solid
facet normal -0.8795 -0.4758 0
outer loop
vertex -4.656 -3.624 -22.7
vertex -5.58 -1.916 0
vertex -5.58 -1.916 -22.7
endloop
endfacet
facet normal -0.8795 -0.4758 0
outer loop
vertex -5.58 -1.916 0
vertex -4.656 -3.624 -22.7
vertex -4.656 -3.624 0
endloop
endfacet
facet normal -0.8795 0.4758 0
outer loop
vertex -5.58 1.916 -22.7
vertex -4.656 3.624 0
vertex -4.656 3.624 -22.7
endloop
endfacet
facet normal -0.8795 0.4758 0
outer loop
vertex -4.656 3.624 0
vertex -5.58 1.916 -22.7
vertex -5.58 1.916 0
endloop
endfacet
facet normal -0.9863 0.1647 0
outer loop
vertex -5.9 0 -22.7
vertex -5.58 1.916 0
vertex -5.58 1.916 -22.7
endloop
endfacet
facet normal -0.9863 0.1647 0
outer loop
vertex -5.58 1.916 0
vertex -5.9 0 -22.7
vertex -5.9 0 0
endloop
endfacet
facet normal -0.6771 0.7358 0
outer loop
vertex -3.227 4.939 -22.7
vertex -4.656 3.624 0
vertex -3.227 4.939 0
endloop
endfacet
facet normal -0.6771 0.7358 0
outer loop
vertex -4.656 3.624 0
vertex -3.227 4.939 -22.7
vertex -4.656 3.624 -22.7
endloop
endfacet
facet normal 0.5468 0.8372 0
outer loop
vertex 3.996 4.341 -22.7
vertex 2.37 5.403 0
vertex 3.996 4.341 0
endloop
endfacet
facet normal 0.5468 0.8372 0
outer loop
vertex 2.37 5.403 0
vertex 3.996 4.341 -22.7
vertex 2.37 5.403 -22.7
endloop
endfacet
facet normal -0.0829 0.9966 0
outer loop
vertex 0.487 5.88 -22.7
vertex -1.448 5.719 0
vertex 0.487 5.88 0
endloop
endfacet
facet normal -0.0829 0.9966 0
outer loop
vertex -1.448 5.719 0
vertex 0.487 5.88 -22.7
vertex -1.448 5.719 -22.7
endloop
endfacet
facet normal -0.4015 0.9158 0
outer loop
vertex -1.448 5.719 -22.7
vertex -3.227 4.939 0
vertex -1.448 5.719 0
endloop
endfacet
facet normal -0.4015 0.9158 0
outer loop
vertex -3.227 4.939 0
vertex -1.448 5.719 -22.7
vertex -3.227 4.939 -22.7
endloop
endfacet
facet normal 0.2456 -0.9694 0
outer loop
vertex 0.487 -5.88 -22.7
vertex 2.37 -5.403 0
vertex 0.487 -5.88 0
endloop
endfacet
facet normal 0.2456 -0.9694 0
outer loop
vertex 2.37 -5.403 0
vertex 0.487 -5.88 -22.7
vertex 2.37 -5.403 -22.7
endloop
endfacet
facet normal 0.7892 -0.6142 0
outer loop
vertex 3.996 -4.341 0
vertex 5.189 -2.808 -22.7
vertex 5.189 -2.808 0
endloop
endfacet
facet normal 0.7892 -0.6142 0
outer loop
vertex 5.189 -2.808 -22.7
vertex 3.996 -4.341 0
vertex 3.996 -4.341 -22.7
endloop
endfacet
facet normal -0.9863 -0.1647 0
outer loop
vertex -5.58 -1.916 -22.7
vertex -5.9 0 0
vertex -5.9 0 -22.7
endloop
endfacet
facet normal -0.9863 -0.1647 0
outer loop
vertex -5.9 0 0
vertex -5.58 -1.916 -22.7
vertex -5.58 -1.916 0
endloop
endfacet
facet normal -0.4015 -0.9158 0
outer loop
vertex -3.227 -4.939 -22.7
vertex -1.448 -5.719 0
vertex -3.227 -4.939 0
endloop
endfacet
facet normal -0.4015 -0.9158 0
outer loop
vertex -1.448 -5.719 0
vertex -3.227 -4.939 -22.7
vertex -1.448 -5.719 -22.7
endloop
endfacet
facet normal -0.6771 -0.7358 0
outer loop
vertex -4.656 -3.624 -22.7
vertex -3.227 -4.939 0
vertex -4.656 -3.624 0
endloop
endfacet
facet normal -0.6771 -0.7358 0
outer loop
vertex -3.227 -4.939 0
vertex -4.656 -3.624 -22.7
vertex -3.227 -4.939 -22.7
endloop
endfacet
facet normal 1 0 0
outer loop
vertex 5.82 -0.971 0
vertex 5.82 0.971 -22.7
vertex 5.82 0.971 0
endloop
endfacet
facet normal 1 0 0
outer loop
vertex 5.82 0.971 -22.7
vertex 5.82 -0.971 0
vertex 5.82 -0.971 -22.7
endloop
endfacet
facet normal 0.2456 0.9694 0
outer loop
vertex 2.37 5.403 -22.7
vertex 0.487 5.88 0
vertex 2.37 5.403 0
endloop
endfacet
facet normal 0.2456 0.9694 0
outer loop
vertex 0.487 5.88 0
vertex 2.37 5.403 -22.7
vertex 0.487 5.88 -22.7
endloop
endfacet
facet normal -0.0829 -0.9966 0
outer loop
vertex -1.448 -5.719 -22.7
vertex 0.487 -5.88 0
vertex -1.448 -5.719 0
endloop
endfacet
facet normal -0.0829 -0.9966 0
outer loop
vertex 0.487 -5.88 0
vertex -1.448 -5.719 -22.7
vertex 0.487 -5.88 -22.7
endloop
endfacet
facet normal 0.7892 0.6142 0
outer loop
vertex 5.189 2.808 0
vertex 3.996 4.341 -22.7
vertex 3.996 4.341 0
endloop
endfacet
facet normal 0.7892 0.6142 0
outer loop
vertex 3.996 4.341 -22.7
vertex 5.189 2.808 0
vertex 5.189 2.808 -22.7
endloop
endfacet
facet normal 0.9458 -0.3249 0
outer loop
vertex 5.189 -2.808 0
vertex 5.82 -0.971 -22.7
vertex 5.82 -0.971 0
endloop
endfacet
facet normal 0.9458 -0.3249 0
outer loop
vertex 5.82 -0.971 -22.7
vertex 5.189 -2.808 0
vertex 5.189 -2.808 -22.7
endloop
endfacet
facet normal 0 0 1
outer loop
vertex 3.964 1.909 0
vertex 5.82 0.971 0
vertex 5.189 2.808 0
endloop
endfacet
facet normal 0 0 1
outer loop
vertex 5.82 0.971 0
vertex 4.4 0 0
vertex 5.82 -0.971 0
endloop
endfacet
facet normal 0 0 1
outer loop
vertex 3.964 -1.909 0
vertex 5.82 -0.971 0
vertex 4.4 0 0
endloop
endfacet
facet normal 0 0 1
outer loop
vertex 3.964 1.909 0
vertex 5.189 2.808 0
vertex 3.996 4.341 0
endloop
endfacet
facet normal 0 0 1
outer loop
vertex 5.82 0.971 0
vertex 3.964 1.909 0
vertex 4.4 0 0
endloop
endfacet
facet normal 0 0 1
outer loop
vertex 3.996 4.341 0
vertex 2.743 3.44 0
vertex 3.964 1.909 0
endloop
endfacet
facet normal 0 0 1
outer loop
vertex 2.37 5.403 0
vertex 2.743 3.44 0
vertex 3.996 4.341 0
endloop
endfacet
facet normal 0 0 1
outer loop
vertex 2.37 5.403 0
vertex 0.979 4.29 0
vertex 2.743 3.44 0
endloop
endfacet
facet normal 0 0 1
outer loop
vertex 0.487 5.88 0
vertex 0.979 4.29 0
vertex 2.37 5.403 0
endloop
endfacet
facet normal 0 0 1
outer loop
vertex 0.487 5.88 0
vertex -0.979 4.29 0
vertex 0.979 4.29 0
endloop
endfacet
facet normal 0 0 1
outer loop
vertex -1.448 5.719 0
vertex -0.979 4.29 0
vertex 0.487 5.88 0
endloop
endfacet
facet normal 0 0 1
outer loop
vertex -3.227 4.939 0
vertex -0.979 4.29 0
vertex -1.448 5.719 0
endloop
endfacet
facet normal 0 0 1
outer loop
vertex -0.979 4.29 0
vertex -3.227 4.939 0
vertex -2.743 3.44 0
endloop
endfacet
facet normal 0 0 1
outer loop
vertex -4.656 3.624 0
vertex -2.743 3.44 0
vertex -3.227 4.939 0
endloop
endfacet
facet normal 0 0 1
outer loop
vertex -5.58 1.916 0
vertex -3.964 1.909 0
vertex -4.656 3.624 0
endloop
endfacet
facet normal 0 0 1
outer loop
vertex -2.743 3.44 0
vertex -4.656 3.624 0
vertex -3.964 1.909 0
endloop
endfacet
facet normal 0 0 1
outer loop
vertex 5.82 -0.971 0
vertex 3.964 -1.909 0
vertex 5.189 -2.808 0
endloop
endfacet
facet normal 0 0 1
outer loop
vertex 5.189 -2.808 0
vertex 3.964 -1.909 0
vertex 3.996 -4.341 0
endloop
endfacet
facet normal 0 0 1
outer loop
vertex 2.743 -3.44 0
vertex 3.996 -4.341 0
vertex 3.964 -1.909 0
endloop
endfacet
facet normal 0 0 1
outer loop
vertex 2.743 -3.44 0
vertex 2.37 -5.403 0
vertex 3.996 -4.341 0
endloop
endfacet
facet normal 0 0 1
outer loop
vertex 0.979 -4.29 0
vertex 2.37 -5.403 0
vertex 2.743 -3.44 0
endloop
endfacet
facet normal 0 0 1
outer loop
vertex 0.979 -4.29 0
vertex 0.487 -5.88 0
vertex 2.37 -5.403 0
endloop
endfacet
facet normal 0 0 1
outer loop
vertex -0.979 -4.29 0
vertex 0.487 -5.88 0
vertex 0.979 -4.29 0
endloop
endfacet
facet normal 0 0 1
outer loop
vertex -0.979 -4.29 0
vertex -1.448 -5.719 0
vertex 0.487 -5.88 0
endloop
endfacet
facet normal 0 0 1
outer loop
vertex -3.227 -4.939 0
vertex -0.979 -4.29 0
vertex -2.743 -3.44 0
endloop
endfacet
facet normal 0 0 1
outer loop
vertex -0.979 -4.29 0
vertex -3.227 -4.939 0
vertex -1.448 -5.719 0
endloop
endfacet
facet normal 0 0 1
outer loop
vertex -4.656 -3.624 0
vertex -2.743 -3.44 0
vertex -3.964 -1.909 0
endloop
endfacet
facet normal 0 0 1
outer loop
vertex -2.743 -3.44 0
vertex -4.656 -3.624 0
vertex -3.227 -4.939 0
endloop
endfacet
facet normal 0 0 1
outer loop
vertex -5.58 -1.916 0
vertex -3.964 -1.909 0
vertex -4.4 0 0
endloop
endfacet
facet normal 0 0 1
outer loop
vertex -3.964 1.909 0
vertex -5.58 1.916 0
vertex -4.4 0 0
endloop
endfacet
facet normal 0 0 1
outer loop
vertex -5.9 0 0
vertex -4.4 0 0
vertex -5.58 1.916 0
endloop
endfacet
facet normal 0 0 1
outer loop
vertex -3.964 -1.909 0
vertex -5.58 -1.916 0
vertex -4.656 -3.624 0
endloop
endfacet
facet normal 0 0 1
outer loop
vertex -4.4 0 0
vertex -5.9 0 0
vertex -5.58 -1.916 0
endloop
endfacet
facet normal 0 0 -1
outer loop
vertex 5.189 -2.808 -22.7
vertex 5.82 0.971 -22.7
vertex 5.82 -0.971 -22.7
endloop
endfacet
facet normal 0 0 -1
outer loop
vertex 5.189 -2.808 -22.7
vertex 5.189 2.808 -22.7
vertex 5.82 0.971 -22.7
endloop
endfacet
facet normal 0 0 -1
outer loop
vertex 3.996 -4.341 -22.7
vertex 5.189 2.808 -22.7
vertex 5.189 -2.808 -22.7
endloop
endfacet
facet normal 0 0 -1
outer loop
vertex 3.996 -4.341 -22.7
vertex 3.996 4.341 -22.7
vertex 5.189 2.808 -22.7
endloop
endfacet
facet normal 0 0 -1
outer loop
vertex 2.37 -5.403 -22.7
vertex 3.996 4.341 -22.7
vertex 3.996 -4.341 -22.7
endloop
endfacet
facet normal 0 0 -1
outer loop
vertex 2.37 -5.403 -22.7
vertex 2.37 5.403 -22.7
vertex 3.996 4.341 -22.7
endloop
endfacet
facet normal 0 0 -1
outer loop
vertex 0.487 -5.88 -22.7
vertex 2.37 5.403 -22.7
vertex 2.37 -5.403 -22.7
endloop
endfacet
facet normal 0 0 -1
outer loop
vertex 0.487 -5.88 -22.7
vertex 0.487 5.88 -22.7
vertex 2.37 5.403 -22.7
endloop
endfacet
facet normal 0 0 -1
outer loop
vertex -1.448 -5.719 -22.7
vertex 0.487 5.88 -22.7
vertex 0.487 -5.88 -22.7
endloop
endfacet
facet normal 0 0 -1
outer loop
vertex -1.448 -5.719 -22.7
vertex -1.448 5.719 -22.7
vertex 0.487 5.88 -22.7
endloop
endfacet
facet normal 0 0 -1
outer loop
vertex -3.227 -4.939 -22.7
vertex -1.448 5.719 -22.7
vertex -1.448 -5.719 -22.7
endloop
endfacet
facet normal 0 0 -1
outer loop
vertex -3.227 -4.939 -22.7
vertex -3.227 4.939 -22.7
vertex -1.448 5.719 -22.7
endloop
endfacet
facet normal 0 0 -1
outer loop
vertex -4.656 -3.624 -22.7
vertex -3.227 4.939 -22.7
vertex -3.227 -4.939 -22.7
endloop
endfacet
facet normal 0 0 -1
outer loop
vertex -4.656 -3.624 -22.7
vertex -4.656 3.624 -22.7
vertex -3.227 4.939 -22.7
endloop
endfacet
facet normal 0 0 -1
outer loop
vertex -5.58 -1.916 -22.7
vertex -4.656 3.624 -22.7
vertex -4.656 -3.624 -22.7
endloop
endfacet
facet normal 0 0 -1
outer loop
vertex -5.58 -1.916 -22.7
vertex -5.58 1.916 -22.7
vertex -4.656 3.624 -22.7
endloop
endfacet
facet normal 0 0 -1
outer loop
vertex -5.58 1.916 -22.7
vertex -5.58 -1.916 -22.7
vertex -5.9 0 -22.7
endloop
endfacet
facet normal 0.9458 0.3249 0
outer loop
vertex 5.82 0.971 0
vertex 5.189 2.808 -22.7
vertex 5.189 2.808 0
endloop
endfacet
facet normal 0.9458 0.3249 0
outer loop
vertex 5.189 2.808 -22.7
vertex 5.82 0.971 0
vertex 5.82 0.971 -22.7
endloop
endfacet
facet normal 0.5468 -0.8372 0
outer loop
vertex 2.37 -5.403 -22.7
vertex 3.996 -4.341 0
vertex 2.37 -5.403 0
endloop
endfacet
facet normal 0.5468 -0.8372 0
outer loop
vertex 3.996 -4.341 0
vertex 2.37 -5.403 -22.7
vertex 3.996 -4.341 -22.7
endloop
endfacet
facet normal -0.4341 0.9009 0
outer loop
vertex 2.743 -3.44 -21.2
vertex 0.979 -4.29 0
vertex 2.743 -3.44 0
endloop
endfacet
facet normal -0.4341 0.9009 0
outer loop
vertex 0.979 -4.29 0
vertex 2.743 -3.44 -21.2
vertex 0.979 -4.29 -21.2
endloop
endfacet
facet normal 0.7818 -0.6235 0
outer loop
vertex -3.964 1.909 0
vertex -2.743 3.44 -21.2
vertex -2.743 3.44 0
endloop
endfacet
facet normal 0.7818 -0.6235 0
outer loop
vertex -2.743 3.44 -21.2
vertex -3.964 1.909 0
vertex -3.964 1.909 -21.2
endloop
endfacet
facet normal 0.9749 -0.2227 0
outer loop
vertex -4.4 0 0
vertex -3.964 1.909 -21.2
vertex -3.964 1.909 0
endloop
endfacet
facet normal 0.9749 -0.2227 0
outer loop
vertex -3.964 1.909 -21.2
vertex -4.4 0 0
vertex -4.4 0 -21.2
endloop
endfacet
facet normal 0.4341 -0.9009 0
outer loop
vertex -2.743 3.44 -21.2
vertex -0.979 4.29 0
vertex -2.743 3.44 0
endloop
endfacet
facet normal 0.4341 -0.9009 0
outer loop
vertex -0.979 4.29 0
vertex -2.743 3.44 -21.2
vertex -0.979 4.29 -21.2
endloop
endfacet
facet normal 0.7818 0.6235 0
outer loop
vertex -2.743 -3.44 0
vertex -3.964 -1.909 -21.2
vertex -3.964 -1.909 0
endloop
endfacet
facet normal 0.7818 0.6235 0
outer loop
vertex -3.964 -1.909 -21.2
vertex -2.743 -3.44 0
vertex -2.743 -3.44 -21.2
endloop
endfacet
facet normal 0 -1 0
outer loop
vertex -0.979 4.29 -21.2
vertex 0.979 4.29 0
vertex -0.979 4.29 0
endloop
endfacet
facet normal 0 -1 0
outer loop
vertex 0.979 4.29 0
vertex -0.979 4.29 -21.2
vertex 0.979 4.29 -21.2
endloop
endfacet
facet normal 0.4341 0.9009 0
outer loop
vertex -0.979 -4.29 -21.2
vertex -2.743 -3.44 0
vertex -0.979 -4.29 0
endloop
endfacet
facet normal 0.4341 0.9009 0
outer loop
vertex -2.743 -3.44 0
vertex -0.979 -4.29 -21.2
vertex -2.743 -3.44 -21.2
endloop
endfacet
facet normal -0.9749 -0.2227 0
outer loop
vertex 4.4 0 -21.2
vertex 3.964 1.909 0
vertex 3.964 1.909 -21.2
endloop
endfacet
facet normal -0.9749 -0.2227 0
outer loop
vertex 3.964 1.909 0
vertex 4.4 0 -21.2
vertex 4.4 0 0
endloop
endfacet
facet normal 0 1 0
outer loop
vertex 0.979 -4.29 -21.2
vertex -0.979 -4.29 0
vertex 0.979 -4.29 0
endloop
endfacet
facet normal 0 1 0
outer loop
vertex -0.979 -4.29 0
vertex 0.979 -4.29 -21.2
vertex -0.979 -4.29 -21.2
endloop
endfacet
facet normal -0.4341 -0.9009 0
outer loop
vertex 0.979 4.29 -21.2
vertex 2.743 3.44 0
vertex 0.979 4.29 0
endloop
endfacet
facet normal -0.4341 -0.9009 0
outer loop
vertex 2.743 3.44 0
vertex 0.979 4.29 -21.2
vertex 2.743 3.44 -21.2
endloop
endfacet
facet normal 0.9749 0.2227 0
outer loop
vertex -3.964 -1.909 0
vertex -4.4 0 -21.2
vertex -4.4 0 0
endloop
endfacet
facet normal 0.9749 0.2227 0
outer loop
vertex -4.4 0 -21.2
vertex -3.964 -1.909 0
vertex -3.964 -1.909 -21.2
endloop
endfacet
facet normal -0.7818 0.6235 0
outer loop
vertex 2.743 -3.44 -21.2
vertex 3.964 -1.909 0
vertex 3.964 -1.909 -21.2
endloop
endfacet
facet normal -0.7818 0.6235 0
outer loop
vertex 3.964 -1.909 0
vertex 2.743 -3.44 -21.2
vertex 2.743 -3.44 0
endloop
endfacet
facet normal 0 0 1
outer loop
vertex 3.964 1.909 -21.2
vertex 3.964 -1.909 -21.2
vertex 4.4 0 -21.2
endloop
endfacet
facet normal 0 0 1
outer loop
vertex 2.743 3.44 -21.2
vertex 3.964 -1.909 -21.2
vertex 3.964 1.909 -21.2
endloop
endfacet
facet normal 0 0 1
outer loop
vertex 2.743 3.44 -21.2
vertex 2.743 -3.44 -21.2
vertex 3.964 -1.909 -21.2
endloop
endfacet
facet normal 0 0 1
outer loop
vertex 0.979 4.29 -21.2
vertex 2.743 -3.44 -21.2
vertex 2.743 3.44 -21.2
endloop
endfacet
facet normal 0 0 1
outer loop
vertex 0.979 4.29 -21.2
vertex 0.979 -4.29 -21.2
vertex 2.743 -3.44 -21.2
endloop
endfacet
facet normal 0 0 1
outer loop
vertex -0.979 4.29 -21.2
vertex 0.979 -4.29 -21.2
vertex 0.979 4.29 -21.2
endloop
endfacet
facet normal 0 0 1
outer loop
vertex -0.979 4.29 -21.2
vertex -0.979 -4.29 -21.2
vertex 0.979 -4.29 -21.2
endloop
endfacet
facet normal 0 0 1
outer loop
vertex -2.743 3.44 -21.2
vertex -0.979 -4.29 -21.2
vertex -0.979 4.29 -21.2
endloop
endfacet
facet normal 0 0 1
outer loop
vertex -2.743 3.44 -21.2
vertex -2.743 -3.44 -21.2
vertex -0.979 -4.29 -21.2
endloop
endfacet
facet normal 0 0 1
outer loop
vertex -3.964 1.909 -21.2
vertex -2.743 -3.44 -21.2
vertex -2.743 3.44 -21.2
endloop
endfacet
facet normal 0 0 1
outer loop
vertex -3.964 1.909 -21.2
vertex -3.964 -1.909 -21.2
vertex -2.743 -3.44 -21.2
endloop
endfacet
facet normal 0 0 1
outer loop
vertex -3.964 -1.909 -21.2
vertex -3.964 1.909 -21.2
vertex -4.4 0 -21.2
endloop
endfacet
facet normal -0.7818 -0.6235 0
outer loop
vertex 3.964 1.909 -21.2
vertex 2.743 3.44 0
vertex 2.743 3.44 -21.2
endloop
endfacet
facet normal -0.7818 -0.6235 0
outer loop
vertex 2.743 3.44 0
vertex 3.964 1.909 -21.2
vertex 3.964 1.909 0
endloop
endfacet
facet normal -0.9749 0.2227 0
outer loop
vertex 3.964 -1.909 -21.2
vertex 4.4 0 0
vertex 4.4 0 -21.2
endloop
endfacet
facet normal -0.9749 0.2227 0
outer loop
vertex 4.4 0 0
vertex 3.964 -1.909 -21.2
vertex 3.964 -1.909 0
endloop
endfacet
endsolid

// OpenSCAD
rotate(180, [0, 1, 0]) {
	difference() {
		union() {
			cylinder(r = 5.9, h = 22.7, center = false);
		}
		cylinder(r = 4.4, h = 21.2, center = false);
	}
}
